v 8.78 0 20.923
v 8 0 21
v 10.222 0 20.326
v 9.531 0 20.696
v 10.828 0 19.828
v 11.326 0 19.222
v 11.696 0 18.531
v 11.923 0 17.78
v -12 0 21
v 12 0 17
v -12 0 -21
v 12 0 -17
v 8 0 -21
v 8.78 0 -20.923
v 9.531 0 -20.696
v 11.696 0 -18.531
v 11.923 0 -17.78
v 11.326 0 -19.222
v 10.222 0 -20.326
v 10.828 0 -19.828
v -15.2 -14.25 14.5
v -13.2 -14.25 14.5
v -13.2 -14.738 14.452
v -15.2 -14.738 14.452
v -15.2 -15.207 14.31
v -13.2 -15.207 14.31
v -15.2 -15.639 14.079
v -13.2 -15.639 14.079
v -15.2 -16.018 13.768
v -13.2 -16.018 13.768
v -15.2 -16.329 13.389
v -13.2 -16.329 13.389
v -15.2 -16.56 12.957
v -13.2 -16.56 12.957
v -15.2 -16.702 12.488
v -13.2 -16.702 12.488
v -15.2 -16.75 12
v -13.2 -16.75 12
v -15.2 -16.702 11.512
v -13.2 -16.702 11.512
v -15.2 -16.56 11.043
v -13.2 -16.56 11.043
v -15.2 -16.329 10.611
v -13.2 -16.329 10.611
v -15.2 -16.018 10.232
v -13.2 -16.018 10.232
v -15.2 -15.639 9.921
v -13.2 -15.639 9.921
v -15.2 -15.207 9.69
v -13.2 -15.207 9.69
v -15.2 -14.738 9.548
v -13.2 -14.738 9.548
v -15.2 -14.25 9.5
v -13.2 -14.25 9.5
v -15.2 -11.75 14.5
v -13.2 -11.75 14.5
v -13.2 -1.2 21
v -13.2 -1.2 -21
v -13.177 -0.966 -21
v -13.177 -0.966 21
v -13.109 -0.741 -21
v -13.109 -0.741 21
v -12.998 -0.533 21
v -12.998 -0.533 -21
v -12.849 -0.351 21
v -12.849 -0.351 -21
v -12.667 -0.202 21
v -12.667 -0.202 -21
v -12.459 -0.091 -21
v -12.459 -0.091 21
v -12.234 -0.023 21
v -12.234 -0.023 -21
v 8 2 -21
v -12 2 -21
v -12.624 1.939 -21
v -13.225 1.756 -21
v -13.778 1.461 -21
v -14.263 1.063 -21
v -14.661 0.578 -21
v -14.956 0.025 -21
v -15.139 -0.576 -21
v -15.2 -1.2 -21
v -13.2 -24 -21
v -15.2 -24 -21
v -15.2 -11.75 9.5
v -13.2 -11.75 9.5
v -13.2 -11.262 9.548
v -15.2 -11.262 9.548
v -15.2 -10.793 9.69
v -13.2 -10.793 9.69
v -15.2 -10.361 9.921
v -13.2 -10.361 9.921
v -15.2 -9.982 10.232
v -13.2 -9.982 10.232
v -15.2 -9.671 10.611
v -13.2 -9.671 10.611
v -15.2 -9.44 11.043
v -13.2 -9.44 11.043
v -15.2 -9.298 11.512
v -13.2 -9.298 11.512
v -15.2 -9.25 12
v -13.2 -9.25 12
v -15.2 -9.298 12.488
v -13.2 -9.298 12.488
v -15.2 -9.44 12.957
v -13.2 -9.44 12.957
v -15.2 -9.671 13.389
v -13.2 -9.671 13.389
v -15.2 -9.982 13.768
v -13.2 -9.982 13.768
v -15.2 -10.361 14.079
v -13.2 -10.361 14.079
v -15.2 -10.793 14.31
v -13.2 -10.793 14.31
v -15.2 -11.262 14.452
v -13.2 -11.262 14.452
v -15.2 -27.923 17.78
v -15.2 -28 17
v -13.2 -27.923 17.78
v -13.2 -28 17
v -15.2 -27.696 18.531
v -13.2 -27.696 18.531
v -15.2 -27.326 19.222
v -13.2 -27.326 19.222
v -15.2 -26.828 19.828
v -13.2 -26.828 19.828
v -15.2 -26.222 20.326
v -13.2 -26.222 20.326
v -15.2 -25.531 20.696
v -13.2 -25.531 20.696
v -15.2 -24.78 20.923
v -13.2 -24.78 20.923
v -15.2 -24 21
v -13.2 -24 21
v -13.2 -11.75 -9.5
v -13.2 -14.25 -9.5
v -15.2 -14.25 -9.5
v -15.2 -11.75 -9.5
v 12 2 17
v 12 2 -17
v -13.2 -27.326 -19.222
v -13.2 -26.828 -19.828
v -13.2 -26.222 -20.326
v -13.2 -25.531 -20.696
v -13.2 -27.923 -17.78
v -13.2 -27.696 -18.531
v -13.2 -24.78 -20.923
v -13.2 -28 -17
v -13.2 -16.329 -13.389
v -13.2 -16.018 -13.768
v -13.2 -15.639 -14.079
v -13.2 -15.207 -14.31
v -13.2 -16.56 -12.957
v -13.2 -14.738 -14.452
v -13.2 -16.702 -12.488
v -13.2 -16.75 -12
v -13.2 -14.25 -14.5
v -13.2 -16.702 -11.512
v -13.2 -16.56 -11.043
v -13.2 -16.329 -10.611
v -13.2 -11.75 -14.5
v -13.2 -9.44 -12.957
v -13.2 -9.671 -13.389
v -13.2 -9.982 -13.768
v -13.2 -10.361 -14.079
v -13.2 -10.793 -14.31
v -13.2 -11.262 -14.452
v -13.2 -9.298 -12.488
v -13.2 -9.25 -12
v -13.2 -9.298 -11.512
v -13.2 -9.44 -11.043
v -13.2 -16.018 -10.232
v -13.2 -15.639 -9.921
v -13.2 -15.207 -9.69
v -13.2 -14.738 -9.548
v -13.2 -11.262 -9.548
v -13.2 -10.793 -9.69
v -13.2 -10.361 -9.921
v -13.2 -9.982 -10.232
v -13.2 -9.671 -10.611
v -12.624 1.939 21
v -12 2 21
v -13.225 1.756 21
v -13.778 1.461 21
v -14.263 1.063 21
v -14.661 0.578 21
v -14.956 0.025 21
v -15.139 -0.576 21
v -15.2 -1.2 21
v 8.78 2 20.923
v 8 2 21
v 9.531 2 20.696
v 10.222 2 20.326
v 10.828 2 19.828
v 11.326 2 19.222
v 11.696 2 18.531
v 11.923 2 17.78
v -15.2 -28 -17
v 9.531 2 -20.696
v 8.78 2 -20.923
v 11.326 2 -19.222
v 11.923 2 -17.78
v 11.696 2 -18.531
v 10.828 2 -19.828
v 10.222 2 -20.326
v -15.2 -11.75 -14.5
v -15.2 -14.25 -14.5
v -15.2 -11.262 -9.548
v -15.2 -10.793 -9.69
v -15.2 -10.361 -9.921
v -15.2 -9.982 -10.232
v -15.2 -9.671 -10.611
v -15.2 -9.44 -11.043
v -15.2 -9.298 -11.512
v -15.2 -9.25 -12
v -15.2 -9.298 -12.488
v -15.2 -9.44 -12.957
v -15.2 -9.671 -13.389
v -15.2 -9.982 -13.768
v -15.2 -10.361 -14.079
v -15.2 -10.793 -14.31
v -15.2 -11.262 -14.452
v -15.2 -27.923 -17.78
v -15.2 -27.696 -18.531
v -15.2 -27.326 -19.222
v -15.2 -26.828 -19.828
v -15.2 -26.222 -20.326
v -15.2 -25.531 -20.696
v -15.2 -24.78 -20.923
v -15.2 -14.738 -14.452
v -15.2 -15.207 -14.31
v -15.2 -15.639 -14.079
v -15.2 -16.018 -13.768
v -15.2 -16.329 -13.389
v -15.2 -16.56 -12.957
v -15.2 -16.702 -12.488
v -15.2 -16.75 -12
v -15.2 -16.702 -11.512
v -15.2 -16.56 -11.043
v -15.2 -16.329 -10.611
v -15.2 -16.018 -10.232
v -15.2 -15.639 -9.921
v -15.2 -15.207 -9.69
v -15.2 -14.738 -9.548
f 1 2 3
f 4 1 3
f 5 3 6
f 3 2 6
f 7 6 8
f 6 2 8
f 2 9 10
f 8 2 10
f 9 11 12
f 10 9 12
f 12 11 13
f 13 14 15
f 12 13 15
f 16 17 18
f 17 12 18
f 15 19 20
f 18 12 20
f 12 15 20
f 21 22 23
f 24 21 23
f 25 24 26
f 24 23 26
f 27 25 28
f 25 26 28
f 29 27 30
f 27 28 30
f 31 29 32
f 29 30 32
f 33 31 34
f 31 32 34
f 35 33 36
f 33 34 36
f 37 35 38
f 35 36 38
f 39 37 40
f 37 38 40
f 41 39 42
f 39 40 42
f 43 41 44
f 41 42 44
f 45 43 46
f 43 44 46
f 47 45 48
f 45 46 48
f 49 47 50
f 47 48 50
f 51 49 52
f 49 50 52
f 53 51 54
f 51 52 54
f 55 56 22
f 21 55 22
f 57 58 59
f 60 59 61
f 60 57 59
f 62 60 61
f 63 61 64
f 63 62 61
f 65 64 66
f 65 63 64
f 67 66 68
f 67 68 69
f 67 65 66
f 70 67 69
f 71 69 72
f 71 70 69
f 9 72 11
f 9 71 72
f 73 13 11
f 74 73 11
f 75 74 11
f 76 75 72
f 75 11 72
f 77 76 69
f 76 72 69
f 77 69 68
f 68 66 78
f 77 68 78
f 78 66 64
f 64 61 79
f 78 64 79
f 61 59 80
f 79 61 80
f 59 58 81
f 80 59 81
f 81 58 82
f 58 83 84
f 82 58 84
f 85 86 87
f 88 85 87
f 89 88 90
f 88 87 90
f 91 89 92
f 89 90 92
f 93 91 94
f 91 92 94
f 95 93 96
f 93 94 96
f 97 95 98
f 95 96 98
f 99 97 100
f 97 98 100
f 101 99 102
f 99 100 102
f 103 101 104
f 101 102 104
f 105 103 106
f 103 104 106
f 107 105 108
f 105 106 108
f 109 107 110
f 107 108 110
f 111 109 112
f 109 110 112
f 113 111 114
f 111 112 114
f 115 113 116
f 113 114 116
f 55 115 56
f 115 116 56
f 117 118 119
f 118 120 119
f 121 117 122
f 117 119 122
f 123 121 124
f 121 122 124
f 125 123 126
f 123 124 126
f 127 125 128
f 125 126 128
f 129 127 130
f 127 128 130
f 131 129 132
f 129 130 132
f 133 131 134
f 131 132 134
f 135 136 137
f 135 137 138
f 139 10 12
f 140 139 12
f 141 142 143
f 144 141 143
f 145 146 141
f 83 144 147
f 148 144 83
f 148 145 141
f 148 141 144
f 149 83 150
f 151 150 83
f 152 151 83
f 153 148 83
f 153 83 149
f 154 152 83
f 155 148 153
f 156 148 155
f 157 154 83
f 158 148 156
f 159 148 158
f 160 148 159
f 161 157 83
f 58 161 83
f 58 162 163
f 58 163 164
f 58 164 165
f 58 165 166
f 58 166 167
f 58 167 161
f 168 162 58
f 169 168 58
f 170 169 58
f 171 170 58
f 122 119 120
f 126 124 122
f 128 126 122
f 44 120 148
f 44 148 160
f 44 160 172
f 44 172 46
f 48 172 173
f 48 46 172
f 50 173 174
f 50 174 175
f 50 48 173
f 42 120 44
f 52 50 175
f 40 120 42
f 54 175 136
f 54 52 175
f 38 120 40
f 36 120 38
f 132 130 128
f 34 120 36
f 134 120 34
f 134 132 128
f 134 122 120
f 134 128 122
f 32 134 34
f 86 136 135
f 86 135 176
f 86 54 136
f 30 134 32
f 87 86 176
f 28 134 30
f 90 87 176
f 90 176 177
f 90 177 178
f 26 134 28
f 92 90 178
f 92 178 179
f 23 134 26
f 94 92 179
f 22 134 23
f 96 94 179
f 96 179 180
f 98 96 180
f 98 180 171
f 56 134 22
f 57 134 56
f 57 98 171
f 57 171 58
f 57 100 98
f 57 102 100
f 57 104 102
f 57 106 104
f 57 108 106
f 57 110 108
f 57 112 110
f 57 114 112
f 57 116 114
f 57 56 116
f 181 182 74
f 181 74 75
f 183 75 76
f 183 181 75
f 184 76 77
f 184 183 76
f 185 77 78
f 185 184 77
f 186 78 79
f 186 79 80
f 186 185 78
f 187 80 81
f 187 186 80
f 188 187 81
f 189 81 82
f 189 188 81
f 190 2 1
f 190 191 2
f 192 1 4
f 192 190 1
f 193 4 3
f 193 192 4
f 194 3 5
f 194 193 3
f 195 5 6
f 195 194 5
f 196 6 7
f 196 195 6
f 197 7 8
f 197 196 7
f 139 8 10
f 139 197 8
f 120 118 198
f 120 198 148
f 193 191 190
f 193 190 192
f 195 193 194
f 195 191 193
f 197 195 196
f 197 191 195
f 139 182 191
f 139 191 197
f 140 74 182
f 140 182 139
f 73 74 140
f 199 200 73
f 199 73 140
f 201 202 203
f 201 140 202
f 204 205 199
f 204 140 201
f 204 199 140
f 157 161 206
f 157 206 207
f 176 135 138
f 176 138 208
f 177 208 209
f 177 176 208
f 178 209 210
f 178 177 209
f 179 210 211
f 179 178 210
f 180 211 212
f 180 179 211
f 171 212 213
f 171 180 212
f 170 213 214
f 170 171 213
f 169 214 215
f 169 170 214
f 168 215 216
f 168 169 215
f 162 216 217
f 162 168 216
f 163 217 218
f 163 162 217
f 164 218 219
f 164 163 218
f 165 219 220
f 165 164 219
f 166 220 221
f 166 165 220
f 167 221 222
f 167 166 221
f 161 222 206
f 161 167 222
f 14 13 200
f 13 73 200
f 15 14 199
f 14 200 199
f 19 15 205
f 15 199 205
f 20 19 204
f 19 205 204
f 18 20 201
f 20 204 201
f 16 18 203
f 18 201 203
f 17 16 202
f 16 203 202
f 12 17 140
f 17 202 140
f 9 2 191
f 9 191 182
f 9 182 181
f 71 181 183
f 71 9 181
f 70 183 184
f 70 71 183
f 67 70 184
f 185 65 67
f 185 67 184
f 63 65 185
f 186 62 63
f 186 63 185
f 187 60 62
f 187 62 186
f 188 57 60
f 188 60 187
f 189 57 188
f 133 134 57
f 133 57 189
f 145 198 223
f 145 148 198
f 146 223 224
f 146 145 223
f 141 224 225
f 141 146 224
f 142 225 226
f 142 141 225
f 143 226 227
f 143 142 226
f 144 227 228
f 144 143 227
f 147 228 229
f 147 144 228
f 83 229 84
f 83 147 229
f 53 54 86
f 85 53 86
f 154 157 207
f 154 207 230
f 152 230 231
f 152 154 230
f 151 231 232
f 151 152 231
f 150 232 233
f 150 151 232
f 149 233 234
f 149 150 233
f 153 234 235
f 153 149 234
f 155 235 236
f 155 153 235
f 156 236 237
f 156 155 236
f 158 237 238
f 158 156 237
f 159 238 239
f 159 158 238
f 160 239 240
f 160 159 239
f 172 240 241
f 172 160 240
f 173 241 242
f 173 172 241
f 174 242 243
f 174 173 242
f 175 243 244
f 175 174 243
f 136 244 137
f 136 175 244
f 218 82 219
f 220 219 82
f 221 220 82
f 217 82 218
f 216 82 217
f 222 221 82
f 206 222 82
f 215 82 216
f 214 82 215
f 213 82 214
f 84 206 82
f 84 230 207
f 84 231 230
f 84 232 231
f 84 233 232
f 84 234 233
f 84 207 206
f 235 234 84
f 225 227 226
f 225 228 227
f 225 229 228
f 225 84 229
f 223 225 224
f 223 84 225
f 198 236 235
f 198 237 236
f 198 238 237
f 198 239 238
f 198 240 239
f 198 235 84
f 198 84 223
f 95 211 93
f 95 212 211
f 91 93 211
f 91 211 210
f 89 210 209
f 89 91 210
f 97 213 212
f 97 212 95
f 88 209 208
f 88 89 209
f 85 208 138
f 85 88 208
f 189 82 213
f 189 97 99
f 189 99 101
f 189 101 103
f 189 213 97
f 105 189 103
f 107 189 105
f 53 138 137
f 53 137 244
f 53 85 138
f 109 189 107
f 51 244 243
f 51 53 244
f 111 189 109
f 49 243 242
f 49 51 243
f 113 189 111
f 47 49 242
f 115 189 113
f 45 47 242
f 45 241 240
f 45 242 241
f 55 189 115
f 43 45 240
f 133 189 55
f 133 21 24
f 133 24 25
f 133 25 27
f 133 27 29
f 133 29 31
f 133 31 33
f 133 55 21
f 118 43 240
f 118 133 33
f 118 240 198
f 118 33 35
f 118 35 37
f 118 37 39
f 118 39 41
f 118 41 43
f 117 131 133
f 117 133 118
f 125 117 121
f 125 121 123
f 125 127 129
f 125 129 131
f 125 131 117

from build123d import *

# Parameters (mm, degrees)
SKETCH1_W          = 24
SKETCH1_H          = 42
BASE_FLANGE1_DEPTH = 2
EDGE_FLANGE1_DEPTH = 42
FILLET1_R          = 4
CUT_EXTRUDE1_DEPTH = 2


# Sheet-metal steps are written as plain solids
with BuildPart() as part:
    # Sketch1 → Base-Flange1 (new body)
    with BuildSketch(Plane(origin=(0, 0, 0), x_dir=(1, 0, 0), z_dir=(0, 1, 0))):
        Rectangle(SKETCH1_W, SKETCH1_H)
    extrude(amount=BASE_FLANGE1_DEPTH)

    # Edge-Flange1 section (across the edge) → Edge-Flange1 (add)
    with BuildSketch(Plane(origin=(-13.2, 0, 21), x_dir=(1, 0, 0), z_dir=(0, 0, -1))):
        with BuildLine():
            Line((-2, 1.2), (-2, 28))
            Line((-2, 28), (0, 28))
            Line((0, 28), (0, 1.2))
            ThreePointArc((0, 1.2), (0.351471863, 0.351471863), (1.2, 0))
            Line((1.2, 0), (1.2, -2))
            ThreePointArc((1.2, -2), (-1.0627417, -1.0627417), (-2, 1.2))
        make_face()
    extrude(amount=EDGE_FLANGE1_DEPTH)

    # Fillet1
    fillet1_edges = [part.edges().sort_by_distance(p)[0] for p in [
        (-14.2, -28, 21),
        (-14.2, -28, -21),
        (12, 1, 21),
        (12, 1, -21),
    ]]
    fillet(fillet1_edges, radius=FILLET1_R)

    # Sketch11 → Cut-Extrude1 (cut)
    with BuildSketch(Plane(origin=(-13.2, 0, 0), x_dir=(0, 0, -1), z_dir=(1, 0, 0))):
        with BuildLine():
            Line((9.5, -14.25), (9.5, -11.75))
            ThreePointArc((9.5, -11.75), (12, -9.25), (14.5, -11.75))
            Line((14.5, -11.75), (14.5, -14.25))
            ThreePointArc((14.5, -14.25), (12, -16.75), (9.5, -14.25))
        make_face()
        with BuildLine():
            Line((-9.5, -14.25), (-9.5, -11.75))
            ThreePointArc((-9.5, -11.75), (-12, -9.25), (-14.5, -11.75))
            Line((-14.5, -11.75), (-14.5, -14.25))
            ThreePointArc((-14.5, -14.25), (-12, -16.75), (-9.5, -14.25))
        make_face()
    extrude(amount=-CUT_EXTRUDE1_DEPTH, mode=Mode.SUBTRACT)


solid = part.part
